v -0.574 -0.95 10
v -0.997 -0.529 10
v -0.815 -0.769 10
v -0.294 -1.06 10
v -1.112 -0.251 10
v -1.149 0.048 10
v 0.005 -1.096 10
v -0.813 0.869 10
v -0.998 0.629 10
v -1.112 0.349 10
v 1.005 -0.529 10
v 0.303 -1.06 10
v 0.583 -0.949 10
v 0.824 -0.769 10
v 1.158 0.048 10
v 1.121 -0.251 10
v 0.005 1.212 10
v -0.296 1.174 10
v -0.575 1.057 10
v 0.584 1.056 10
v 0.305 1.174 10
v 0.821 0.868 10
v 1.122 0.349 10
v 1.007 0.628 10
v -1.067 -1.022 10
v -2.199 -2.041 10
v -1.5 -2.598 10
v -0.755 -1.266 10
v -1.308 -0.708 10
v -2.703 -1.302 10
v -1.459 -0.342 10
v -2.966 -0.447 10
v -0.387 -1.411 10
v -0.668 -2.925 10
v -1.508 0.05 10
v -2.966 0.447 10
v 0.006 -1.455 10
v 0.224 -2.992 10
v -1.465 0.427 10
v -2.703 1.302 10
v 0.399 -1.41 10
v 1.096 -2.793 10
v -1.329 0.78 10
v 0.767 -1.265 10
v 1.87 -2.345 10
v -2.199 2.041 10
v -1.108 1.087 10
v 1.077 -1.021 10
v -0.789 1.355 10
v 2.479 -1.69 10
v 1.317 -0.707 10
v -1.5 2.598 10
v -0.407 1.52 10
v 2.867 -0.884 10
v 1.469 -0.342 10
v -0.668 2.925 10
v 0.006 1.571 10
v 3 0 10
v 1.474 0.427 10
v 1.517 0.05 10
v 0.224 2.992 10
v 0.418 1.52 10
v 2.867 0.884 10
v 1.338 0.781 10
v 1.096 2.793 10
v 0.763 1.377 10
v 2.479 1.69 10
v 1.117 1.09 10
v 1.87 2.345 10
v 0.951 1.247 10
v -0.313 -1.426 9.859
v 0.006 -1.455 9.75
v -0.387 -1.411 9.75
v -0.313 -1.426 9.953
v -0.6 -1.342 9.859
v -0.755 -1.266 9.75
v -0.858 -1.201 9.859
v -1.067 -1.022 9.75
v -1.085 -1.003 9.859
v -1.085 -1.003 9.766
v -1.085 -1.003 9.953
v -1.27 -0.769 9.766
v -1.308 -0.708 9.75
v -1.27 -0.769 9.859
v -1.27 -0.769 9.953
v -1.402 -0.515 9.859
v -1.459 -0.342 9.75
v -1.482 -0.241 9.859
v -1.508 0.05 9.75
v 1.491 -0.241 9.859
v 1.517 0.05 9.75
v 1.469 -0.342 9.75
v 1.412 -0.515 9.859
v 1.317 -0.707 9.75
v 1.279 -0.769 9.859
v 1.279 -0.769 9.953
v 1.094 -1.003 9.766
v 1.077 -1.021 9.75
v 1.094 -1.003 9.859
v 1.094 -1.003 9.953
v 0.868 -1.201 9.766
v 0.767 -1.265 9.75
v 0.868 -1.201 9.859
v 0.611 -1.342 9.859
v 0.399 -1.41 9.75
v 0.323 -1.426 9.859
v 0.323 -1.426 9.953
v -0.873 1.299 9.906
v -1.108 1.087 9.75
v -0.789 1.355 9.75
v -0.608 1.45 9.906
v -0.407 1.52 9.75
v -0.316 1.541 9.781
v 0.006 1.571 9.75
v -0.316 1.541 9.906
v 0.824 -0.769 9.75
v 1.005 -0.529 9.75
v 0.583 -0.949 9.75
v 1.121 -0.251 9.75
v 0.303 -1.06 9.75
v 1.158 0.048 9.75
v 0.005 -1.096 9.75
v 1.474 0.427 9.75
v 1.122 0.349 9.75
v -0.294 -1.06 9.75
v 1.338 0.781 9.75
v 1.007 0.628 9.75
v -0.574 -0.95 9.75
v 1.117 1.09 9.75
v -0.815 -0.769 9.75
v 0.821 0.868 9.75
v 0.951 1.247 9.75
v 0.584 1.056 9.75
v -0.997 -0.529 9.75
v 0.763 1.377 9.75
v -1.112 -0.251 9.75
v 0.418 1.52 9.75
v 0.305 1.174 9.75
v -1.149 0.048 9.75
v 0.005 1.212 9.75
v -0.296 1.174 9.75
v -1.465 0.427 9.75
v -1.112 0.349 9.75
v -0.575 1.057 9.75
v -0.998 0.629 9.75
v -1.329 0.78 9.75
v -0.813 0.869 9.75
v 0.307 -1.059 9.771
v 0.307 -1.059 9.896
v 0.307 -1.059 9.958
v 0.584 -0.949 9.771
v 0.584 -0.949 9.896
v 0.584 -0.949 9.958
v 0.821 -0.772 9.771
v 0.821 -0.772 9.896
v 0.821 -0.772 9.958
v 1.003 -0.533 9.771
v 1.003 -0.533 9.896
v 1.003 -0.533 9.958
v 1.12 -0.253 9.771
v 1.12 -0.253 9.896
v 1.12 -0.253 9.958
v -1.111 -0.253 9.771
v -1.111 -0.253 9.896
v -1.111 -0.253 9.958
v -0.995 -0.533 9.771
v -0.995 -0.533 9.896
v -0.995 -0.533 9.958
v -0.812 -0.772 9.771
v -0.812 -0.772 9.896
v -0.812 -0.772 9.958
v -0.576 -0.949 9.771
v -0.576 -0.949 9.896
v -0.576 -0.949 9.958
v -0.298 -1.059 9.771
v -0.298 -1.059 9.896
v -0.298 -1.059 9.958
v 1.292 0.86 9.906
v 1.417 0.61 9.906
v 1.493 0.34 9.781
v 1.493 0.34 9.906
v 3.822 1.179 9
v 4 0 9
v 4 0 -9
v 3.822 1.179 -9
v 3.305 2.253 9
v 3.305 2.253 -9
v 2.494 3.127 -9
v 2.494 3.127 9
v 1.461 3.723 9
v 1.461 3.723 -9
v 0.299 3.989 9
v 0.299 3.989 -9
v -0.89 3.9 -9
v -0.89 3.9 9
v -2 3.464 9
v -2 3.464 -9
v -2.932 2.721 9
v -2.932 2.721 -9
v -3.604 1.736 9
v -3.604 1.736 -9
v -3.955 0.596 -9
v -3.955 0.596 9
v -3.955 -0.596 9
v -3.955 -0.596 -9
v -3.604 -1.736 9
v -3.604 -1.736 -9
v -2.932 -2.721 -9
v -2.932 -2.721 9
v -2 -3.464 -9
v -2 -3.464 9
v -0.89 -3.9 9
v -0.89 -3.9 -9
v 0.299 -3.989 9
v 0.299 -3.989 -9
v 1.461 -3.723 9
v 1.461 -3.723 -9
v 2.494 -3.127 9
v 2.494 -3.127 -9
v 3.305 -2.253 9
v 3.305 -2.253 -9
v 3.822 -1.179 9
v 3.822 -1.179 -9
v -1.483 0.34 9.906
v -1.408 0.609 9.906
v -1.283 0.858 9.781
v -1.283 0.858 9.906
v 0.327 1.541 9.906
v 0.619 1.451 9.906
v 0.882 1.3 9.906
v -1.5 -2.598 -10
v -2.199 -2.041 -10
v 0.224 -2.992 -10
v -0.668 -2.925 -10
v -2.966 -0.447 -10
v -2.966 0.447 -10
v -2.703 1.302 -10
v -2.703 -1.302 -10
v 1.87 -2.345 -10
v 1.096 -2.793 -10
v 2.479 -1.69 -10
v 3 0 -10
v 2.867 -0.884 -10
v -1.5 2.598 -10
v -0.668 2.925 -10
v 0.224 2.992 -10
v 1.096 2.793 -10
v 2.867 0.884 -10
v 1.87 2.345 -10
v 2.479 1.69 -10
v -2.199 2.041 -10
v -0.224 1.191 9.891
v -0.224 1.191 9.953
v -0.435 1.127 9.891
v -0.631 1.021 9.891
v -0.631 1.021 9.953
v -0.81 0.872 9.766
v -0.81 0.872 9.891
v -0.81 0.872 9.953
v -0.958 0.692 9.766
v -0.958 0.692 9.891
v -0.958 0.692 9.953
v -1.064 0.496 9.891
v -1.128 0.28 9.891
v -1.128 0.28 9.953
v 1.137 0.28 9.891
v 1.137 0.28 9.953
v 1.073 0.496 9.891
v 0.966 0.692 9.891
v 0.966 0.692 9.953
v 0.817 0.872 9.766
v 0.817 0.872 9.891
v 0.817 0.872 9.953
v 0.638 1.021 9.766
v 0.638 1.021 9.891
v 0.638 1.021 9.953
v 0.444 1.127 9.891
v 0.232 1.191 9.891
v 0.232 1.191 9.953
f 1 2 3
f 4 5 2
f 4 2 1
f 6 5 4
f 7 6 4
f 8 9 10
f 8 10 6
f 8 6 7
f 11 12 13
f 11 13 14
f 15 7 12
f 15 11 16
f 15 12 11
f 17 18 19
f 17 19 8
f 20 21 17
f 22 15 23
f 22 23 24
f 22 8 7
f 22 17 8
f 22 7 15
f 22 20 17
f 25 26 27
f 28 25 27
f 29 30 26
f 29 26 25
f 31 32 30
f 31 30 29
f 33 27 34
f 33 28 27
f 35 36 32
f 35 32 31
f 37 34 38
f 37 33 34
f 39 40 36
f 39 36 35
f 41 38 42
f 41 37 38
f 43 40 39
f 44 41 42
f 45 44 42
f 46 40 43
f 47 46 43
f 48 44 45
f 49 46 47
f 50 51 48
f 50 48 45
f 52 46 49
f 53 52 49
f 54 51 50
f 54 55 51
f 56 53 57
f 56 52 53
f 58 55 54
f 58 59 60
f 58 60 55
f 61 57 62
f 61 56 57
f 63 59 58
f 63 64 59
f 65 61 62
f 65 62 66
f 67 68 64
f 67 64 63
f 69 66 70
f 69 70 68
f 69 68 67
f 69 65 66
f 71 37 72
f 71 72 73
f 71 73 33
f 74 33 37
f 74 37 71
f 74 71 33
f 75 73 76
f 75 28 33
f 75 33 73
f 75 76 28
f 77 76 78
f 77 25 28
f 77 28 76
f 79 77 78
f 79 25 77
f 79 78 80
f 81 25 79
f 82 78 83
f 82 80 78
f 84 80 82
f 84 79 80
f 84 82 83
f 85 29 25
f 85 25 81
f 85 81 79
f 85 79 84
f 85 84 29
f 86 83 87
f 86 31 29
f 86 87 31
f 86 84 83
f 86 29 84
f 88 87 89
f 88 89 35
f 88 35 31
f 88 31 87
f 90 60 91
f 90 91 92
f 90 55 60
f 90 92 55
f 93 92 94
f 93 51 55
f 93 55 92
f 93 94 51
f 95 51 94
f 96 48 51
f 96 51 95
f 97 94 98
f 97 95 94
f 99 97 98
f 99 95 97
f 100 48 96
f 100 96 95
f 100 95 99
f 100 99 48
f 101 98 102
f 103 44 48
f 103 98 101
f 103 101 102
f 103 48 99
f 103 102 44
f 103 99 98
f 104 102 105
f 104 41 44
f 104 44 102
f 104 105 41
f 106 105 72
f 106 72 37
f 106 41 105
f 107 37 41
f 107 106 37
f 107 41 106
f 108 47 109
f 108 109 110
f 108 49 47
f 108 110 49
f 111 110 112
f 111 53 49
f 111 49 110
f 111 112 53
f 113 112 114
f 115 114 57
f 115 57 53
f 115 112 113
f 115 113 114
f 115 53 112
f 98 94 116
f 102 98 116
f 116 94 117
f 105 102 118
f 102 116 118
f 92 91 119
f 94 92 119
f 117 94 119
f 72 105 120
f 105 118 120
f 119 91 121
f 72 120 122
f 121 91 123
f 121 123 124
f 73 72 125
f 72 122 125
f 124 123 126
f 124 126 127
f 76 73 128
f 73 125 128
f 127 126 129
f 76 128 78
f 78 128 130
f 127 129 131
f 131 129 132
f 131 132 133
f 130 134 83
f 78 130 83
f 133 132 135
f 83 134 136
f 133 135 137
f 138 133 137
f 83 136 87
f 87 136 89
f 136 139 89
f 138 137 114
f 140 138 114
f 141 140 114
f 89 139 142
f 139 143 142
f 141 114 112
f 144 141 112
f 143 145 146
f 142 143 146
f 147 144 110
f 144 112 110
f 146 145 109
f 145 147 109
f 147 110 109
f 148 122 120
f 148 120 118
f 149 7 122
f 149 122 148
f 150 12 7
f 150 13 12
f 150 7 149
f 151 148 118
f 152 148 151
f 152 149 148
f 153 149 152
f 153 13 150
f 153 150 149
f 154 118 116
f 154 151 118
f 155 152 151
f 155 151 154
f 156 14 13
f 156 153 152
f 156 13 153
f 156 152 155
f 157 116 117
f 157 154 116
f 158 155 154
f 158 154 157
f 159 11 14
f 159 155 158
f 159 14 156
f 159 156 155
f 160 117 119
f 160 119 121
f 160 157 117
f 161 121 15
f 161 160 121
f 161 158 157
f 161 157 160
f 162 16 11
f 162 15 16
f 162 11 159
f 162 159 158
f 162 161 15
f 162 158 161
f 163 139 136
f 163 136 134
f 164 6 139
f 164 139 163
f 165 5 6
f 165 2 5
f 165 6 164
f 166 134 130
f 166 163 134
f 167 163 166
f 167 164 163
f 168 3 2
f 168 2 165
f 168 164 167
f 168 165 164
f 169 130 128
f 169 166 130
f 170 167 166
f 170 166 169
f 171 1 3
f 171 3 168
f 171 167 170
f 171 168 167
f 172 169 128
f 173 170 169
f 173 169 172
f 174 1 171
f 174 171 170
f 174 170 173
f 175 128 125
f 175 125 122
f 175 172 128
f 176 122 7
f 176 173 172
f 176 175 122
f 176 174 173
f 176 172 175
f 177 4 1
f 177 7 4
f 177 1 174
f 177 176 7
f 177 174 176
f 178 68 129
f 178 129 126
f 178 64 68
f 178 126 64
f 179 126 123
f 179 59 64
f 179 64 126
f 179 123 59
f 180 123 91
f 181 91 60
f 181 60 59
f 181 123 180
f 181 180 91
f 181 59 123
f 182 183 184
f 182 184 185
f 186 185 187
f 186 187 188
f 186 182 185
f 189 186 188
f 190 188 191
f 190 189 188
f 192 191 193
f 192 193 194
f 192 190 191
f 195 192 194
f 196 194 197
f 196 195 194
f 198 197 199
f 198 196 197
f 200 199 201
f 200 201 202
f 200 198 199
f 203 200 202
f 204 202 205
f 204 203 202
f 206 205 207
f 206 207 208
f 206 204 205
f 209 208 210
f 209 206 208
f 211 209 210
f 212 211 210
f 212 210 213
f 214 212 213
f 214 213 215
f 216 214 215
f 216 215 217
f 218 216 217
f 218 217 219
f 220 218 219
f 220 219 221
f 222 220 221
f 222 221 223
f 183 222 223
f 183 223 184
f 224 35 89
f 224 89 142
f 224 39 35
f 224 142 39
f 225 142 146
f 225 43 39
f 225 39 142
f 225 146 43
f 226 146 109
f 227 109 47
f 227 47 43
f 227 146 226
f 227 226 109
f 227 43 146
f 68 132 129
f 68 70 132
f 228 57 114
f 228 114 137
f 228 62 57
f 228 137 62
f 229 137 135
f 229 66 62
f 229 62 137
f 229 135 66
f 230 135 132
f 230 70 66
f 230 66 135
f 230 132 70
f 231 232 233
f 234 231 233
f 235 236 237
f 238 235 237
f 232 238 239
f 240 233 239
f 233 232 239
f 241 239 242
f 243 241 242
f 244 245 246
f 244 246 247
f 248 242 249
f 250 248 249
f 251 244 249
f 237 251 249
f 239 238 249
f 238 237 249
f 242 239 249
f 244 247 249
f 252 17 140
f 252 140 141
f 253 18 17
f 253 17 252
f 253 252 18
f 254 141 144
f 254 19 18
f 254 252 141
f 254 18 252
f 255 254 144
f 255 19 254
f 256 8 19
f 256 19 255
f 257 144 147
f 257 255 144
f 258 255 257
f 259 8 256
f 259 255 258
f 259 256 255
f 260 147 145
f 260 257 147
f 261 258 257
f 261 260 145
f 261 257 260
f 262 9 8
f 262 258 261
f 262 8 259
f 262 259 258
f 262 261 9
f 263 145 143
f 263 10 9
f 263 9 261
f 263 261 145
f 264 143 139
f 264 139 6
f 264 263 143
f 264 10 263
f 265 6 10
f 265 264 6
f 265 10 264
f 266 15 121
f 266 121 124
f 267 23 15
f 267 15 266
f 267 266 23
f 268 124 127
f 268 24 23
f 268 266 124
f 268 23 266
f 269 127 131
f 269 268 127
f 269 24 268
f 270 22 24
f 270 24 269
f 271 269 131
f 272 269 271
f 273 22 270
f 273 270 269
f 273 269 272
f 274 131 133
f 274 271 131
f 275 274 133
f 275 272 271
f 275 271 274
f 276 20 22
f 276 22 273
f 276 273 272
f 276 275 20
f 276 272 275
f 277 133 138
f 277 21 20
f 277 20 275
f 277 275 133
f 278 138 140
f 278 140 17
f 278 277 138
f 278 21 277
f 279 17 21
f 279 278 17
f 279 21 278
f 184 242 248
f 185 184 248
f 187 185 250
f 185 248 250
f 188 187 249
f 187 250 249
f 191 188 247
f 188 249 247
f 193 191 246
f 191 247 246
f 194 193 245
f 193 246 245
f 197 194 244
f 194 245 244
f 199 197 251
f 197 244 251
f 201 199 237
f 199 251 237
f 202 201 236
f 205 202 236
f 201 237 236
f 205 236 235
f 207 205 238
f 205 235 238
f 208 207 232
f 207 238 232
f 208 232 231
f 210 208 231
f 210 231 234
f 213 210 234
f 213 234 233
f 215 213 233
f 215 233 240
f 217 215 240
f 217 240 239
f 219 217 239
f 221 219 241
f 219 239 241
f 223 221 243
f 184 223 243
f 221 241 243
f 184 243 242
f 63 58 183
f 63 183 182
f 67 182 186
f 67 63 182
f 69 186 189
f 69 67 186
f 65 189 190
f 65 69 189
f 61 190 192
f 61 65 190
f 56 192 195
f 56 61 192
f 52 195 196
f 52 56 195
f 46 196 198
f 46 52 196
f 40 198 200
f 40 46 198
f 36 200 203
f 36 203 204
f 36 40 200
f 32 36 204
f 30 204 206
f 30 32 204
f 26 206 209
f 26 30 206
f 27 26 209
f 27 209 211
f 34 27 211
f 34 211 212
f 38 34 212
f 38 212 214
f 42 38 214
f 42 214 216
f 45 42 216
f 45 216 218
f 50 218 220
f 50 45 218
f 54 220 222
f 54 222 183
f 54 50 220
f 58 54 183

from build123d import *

# Parameters (mm, degrees)
SKETCH1_R           = 4
BOSS_EXTRUDE1_DEPTH = 10
CHAMFER1_SIZE       = 1
CUT_EXTRUDE2_DEPTH  = 0.25


with BuildPart() as part:
    # Sketch1 → Boss-Extrude1 (new, symmetric)
    with BuildSketch(Plane(origin=(0, 0, 0), x_dir=(0, 1, 0), z_dir=(0, 0, 1))):
        with Locations(Location((0, 0, 0), (0, 0, 270))):
            Circle(SKETCH1_R)
    extrude(amount=BOSS_EXTRUDE1_DEPTH, both=True)

    # Chamfer1
    chamfer1_edges = [part.edges().sort_by_distance(p)[0] for p in [
        (-4, 0, -10),
        (-4, 0, 10),
    ]]
    chamfer(chamfer1_edges, length=CHAMFER1_SIZE)

    # Sketch4 → Cut-Extrude2 (cut)
    with BuildSketch(Plane.XY.offset(10)):
        with BuildLine():
            add(Edge.make_bspline(
                [(0.00617457, 1.571131981), (0.061021739, 1.569964106), (0.168563633, 1.567674187), (0.32605836, 1.543199941), (0.476395658, 1.505774381), (0.620151307, 1.454035453), (0.755484216, 1.384684653), (0.884365637, 1.301931177), (1.006442219, 1.203893927), (1.079611395, 1.128056135), (1.116751493, 1.089561468)],
                knots=[0, 0, 0, 0, 1.054011418, 2.066658804, 3.057071809, 4.030435133, 4.997543892, 5.974964718, 6.972108034, 8, 8, 8, 8], degree=3))
            add(Edge.make_bspline(
                [(1.116751493, 1.089561468), (1.148730869, 1.052745485), (1.212070732, 0.979826008), (1.293288697, 0.861591022), (1.363256194, 0.739145192), (1.419328149, 0.610862533), (1.463539605, 0.477862909), (1.494928972, 0.339689182), (1.513599755, 0.1966465), (1.516117432, 0.099499256), (1.517392519, 0.050298648)],
                knots=[0, 0, 0, 0, 1.025258237, 2.030674902, 3.01204498, 3.988269485, 4.97094183, 5.956517959, 6.965070386, 8, 8, 8, 8], degree=3))
            add(Edge.make_bspline(
                [(1.517392519, 0.050298648), (1.51627099, 0.000812868), (1.514054798, -0.096973342), (1.493090665, -0.240995474), (1.46048371, -0.3806467), (1.413818752, -0.51534235), (1.353980913, -0.645494153), (1.280962984, -0.770533638), (1.194252564, -0.890707504), (1.095962282, -1.004995319), (0.987331567, -1.110328136), (0.86948454, -1.202131873), (0.744737073, -1.280785044), (0.611430384, -1.344140947), (0.470781827, -1.39409489), (0.322488035, -1.429180623), (0.166779383, -1.450393976), (0.060462559, -1.45311806), (0.00617457, -1.454509044)],
                knots=[0, 0, 0, 0, 0.998656419, 1.973391657, 2.932242238, 3.890759089, 4.846373663, 5.82037756, 6.809684879, 7.83454468, 8.860553229, 9.859544525, 10.845671541, 11.83227036, 12.833544569, 13.85385346, 14.904124723, 16, 16, 16, 16], degree=3))
            add(Edge.make_bspline(
                [(0.00617457, -1.454509044), (-0.048379395, -1.453113392), (-0.155226092, -1.450379935), (-0.311484357, -1.42926304), (-0.460043921, -1.39411106), (-0.600876605, -1.343976783), (-0.734756431, -1.280783019), (-0.860226713, -1.202369659), (-0.978169473, -1.11030091), (-1.08682317, -1.005002697), (-1.18510729, -0.890705604), (-1.2718193, -0.770534131), (-1.344836815, -0.645494024), (-1.404674763, -0.515342384), (-1.451339692, -0.380646691), (-1.483946655, -0.240995477), (-1.504910786, -0.096973341), (-1.507126978, 0.000812868), (-1.508248507, 0.050298648)],
                knots=[0, 0, 0, 0, 1.099876186, 2.154163076, 3.173186993, 4.173200201, 5.163417411, 6.152872554, 7.150605724, 8.17532212, 9.198891216, 10.186952605, 11.159729845, 12.11414092, 13.071450619, 14.029093627, 15.002601286, 16, 16, 16, 16], degree=3))
            add(Edge.make_bspline(
                [(-1.508248507, 0.050298648), (-1.506964724, 0.099231843), (-1.504423053, 0.19611116), (-1.485771043, 0.338884944), (-1.454504121, 0.476824817), (-1.410239668, 0.609311075), (-1.353650879, 0.737031574), (-1.28466655, 0.859779952), (-1.202620112, 0.977480295), (-1.139532168, 1.05030553), (-1.107607481, 1.087157622)],
                knots=[0, 0, 0, 0, 1.031353054, 2.041901799, 3.029428768, 4.008703097, 4.981709435, 5.96992636, 6.972712378, 8, 8, 8, 8], degree=3))
            add(Edge.make_bspline(
                [(-1.107607481, 1.087157622), (-1.070523377, 1.125986124), (-0.997590961, 1.202349206), (-0.874906701, 1.300100662), (-0.746342334, 1.384576175), (-0.609513847, 1.452548992), (-0.465876295, 1.506078727), (-0.314768589, 1.543296459), (-0.156739429, 1.567586007), (-0.04867129, 1.56993821), (0.00617457, 1.571131981)],
                knots=[0, 0, 0, 0, 1.027980169, 2.021703884, 2.998553061, 3.971491411, 4.943284454, 5.930300938, 6.949603206, 8, 8, 8, 8], degree=3))
        make_face()
        with BuildLine():
            add(Edge.make_bspline(
                [(0.004572006, 1.212157622), (-0.034213836, 1.211055232), (-0.110784268, 1.208878909), (-0.223492365, 1.192325875), (-0.331995398, 1.166100156), (-0.43649922, 1.128838377), (-0.536651417, 1.08072535), (-0.632547877, 1.021630081), (-0.724470665, 0.952335274), (-0.810621595, 0.872949363), (-0.889687095, 0.786230513), (-0.958804782, 0.693832388), (-1.017576332, 0.597253707), (-1.066536514, 0.496394037), (-1.103001872, 0.390231278), (-1.129485326, 0.2799677), (-1.146022744, 0.165378652), (-1.148178605, 0.087480345), (-1.149274148, 0.047894802)],
                knots=[0, 0, 0, 0, 1.021534396, 2.016698045, 2.994645724, 3.958388632, 4.93408049, 5.916473867, 6.921342795, 7.962252576, 8.998418191, 10.008913653, 10.997312074, 11.973003931, 12.956656626, 13.948281152, 14.957379055, 16, 16, 16, 16], degree=3))
            add(Edge.make_bspline(
                [(-1.149274148, 0.047894802), (-1.147437778, -0.003250372), (-1.143792927, -0.104763978), (-1.114152657, -0.254262404), (-1.064568337, -0.397784521), (-0.997611446, -0.534488962), (-0.913718625, -0.660971566), (-0.814876263, -0.773738976), (-0.702145177, -0.871094189), (-0.576869176, -0.951872299), (-0.441607099, -1.016054877), (-0.298457018, -1.06153942), (-0.149153367, -1.091107069), (-0.047118246, -1.094045897), (0.004572006, -1.095534685)],
                knots=[0, 0, 0, 0, 1.016792936, 2.018143844, 3.017858371, 4.030088057, 5.03801393, 6.028138512, 7.003788237, 7.991172063, 8.984598303, 9.972568034, 10.972917682, 12, 12, 12, 12], degree=3))
            add(Edge.make_bspline(
                [(0.004572006, -1.095534685), (0.056259285, -1.094037222), (0.158288537, -1.091081272), (0.307384739, -1.061688335), (0.450143564, -1.01585558), (0.58526515, -0.951944483), (0.710484125, -0.870787437), (0.824025978, -0.77428872), (0.922024391, -0.66067289), (1.005834225, -0.534321429), (1.073887646, -0.397996455), (1.123239876, -0.254235915), (1.152951403, -0.104770724), (1.156586636, -0.003252632), (1.15841816, 0.047894802)],
                knots=[0, 0, 0, 0, 1.02726834, 2.027799167, 3.010890988, 4.004497153, 4.992059811, 5.971914811, 6.958719428, 7.966827853, 8.981595046, 9.981490638, 10.983022906, 12, 12, 12, 12], degree=3))
            add(Edge.make_bspline(
                [(1.15841816, 0.047894802), (1.157322994, 0.087480582), (1.155167875, 0.165379354), (1.138625059, 0.279965015), (1.112161585, 0.390241126), (1.075622594, 0.496357701), (1.026875149, 0.597514849), (0.966970243, 0.693548823), (0.898134785, 0.78655059), (0.818115218, 0.872669036), (0.732054215, 0.952366221), (0.640094172, 1.021656952), (0.54433991, 1.080465632), (0.444478673, 1.129249907), (0.339961453, 1.165761153), (0.231610448, 1.192477303), (0.119383237, 1.208808957), (0.043087187, 1.211034261), (0.004572006, 1.212157622)],
                knots=[0, 0, 0, 0, 1.042956736, 2.052379634, 3.044323526, 4.02829302, 5.004299113, 5.996692471, 7.007513377, 8.048758398, 9.090003419, 10.095195979, 11.07790575, 12.047570684, 13.018257071, 13.989683339, 14.985167495, 16, 16, 16, 16], degree=3))
        make_face(mode=Mode.SUBTRACT)
    extrude(amount=-CUT_EXTRUDE2_DEPTH, mode=Mode.SUBTRACT)


solid = part.part
